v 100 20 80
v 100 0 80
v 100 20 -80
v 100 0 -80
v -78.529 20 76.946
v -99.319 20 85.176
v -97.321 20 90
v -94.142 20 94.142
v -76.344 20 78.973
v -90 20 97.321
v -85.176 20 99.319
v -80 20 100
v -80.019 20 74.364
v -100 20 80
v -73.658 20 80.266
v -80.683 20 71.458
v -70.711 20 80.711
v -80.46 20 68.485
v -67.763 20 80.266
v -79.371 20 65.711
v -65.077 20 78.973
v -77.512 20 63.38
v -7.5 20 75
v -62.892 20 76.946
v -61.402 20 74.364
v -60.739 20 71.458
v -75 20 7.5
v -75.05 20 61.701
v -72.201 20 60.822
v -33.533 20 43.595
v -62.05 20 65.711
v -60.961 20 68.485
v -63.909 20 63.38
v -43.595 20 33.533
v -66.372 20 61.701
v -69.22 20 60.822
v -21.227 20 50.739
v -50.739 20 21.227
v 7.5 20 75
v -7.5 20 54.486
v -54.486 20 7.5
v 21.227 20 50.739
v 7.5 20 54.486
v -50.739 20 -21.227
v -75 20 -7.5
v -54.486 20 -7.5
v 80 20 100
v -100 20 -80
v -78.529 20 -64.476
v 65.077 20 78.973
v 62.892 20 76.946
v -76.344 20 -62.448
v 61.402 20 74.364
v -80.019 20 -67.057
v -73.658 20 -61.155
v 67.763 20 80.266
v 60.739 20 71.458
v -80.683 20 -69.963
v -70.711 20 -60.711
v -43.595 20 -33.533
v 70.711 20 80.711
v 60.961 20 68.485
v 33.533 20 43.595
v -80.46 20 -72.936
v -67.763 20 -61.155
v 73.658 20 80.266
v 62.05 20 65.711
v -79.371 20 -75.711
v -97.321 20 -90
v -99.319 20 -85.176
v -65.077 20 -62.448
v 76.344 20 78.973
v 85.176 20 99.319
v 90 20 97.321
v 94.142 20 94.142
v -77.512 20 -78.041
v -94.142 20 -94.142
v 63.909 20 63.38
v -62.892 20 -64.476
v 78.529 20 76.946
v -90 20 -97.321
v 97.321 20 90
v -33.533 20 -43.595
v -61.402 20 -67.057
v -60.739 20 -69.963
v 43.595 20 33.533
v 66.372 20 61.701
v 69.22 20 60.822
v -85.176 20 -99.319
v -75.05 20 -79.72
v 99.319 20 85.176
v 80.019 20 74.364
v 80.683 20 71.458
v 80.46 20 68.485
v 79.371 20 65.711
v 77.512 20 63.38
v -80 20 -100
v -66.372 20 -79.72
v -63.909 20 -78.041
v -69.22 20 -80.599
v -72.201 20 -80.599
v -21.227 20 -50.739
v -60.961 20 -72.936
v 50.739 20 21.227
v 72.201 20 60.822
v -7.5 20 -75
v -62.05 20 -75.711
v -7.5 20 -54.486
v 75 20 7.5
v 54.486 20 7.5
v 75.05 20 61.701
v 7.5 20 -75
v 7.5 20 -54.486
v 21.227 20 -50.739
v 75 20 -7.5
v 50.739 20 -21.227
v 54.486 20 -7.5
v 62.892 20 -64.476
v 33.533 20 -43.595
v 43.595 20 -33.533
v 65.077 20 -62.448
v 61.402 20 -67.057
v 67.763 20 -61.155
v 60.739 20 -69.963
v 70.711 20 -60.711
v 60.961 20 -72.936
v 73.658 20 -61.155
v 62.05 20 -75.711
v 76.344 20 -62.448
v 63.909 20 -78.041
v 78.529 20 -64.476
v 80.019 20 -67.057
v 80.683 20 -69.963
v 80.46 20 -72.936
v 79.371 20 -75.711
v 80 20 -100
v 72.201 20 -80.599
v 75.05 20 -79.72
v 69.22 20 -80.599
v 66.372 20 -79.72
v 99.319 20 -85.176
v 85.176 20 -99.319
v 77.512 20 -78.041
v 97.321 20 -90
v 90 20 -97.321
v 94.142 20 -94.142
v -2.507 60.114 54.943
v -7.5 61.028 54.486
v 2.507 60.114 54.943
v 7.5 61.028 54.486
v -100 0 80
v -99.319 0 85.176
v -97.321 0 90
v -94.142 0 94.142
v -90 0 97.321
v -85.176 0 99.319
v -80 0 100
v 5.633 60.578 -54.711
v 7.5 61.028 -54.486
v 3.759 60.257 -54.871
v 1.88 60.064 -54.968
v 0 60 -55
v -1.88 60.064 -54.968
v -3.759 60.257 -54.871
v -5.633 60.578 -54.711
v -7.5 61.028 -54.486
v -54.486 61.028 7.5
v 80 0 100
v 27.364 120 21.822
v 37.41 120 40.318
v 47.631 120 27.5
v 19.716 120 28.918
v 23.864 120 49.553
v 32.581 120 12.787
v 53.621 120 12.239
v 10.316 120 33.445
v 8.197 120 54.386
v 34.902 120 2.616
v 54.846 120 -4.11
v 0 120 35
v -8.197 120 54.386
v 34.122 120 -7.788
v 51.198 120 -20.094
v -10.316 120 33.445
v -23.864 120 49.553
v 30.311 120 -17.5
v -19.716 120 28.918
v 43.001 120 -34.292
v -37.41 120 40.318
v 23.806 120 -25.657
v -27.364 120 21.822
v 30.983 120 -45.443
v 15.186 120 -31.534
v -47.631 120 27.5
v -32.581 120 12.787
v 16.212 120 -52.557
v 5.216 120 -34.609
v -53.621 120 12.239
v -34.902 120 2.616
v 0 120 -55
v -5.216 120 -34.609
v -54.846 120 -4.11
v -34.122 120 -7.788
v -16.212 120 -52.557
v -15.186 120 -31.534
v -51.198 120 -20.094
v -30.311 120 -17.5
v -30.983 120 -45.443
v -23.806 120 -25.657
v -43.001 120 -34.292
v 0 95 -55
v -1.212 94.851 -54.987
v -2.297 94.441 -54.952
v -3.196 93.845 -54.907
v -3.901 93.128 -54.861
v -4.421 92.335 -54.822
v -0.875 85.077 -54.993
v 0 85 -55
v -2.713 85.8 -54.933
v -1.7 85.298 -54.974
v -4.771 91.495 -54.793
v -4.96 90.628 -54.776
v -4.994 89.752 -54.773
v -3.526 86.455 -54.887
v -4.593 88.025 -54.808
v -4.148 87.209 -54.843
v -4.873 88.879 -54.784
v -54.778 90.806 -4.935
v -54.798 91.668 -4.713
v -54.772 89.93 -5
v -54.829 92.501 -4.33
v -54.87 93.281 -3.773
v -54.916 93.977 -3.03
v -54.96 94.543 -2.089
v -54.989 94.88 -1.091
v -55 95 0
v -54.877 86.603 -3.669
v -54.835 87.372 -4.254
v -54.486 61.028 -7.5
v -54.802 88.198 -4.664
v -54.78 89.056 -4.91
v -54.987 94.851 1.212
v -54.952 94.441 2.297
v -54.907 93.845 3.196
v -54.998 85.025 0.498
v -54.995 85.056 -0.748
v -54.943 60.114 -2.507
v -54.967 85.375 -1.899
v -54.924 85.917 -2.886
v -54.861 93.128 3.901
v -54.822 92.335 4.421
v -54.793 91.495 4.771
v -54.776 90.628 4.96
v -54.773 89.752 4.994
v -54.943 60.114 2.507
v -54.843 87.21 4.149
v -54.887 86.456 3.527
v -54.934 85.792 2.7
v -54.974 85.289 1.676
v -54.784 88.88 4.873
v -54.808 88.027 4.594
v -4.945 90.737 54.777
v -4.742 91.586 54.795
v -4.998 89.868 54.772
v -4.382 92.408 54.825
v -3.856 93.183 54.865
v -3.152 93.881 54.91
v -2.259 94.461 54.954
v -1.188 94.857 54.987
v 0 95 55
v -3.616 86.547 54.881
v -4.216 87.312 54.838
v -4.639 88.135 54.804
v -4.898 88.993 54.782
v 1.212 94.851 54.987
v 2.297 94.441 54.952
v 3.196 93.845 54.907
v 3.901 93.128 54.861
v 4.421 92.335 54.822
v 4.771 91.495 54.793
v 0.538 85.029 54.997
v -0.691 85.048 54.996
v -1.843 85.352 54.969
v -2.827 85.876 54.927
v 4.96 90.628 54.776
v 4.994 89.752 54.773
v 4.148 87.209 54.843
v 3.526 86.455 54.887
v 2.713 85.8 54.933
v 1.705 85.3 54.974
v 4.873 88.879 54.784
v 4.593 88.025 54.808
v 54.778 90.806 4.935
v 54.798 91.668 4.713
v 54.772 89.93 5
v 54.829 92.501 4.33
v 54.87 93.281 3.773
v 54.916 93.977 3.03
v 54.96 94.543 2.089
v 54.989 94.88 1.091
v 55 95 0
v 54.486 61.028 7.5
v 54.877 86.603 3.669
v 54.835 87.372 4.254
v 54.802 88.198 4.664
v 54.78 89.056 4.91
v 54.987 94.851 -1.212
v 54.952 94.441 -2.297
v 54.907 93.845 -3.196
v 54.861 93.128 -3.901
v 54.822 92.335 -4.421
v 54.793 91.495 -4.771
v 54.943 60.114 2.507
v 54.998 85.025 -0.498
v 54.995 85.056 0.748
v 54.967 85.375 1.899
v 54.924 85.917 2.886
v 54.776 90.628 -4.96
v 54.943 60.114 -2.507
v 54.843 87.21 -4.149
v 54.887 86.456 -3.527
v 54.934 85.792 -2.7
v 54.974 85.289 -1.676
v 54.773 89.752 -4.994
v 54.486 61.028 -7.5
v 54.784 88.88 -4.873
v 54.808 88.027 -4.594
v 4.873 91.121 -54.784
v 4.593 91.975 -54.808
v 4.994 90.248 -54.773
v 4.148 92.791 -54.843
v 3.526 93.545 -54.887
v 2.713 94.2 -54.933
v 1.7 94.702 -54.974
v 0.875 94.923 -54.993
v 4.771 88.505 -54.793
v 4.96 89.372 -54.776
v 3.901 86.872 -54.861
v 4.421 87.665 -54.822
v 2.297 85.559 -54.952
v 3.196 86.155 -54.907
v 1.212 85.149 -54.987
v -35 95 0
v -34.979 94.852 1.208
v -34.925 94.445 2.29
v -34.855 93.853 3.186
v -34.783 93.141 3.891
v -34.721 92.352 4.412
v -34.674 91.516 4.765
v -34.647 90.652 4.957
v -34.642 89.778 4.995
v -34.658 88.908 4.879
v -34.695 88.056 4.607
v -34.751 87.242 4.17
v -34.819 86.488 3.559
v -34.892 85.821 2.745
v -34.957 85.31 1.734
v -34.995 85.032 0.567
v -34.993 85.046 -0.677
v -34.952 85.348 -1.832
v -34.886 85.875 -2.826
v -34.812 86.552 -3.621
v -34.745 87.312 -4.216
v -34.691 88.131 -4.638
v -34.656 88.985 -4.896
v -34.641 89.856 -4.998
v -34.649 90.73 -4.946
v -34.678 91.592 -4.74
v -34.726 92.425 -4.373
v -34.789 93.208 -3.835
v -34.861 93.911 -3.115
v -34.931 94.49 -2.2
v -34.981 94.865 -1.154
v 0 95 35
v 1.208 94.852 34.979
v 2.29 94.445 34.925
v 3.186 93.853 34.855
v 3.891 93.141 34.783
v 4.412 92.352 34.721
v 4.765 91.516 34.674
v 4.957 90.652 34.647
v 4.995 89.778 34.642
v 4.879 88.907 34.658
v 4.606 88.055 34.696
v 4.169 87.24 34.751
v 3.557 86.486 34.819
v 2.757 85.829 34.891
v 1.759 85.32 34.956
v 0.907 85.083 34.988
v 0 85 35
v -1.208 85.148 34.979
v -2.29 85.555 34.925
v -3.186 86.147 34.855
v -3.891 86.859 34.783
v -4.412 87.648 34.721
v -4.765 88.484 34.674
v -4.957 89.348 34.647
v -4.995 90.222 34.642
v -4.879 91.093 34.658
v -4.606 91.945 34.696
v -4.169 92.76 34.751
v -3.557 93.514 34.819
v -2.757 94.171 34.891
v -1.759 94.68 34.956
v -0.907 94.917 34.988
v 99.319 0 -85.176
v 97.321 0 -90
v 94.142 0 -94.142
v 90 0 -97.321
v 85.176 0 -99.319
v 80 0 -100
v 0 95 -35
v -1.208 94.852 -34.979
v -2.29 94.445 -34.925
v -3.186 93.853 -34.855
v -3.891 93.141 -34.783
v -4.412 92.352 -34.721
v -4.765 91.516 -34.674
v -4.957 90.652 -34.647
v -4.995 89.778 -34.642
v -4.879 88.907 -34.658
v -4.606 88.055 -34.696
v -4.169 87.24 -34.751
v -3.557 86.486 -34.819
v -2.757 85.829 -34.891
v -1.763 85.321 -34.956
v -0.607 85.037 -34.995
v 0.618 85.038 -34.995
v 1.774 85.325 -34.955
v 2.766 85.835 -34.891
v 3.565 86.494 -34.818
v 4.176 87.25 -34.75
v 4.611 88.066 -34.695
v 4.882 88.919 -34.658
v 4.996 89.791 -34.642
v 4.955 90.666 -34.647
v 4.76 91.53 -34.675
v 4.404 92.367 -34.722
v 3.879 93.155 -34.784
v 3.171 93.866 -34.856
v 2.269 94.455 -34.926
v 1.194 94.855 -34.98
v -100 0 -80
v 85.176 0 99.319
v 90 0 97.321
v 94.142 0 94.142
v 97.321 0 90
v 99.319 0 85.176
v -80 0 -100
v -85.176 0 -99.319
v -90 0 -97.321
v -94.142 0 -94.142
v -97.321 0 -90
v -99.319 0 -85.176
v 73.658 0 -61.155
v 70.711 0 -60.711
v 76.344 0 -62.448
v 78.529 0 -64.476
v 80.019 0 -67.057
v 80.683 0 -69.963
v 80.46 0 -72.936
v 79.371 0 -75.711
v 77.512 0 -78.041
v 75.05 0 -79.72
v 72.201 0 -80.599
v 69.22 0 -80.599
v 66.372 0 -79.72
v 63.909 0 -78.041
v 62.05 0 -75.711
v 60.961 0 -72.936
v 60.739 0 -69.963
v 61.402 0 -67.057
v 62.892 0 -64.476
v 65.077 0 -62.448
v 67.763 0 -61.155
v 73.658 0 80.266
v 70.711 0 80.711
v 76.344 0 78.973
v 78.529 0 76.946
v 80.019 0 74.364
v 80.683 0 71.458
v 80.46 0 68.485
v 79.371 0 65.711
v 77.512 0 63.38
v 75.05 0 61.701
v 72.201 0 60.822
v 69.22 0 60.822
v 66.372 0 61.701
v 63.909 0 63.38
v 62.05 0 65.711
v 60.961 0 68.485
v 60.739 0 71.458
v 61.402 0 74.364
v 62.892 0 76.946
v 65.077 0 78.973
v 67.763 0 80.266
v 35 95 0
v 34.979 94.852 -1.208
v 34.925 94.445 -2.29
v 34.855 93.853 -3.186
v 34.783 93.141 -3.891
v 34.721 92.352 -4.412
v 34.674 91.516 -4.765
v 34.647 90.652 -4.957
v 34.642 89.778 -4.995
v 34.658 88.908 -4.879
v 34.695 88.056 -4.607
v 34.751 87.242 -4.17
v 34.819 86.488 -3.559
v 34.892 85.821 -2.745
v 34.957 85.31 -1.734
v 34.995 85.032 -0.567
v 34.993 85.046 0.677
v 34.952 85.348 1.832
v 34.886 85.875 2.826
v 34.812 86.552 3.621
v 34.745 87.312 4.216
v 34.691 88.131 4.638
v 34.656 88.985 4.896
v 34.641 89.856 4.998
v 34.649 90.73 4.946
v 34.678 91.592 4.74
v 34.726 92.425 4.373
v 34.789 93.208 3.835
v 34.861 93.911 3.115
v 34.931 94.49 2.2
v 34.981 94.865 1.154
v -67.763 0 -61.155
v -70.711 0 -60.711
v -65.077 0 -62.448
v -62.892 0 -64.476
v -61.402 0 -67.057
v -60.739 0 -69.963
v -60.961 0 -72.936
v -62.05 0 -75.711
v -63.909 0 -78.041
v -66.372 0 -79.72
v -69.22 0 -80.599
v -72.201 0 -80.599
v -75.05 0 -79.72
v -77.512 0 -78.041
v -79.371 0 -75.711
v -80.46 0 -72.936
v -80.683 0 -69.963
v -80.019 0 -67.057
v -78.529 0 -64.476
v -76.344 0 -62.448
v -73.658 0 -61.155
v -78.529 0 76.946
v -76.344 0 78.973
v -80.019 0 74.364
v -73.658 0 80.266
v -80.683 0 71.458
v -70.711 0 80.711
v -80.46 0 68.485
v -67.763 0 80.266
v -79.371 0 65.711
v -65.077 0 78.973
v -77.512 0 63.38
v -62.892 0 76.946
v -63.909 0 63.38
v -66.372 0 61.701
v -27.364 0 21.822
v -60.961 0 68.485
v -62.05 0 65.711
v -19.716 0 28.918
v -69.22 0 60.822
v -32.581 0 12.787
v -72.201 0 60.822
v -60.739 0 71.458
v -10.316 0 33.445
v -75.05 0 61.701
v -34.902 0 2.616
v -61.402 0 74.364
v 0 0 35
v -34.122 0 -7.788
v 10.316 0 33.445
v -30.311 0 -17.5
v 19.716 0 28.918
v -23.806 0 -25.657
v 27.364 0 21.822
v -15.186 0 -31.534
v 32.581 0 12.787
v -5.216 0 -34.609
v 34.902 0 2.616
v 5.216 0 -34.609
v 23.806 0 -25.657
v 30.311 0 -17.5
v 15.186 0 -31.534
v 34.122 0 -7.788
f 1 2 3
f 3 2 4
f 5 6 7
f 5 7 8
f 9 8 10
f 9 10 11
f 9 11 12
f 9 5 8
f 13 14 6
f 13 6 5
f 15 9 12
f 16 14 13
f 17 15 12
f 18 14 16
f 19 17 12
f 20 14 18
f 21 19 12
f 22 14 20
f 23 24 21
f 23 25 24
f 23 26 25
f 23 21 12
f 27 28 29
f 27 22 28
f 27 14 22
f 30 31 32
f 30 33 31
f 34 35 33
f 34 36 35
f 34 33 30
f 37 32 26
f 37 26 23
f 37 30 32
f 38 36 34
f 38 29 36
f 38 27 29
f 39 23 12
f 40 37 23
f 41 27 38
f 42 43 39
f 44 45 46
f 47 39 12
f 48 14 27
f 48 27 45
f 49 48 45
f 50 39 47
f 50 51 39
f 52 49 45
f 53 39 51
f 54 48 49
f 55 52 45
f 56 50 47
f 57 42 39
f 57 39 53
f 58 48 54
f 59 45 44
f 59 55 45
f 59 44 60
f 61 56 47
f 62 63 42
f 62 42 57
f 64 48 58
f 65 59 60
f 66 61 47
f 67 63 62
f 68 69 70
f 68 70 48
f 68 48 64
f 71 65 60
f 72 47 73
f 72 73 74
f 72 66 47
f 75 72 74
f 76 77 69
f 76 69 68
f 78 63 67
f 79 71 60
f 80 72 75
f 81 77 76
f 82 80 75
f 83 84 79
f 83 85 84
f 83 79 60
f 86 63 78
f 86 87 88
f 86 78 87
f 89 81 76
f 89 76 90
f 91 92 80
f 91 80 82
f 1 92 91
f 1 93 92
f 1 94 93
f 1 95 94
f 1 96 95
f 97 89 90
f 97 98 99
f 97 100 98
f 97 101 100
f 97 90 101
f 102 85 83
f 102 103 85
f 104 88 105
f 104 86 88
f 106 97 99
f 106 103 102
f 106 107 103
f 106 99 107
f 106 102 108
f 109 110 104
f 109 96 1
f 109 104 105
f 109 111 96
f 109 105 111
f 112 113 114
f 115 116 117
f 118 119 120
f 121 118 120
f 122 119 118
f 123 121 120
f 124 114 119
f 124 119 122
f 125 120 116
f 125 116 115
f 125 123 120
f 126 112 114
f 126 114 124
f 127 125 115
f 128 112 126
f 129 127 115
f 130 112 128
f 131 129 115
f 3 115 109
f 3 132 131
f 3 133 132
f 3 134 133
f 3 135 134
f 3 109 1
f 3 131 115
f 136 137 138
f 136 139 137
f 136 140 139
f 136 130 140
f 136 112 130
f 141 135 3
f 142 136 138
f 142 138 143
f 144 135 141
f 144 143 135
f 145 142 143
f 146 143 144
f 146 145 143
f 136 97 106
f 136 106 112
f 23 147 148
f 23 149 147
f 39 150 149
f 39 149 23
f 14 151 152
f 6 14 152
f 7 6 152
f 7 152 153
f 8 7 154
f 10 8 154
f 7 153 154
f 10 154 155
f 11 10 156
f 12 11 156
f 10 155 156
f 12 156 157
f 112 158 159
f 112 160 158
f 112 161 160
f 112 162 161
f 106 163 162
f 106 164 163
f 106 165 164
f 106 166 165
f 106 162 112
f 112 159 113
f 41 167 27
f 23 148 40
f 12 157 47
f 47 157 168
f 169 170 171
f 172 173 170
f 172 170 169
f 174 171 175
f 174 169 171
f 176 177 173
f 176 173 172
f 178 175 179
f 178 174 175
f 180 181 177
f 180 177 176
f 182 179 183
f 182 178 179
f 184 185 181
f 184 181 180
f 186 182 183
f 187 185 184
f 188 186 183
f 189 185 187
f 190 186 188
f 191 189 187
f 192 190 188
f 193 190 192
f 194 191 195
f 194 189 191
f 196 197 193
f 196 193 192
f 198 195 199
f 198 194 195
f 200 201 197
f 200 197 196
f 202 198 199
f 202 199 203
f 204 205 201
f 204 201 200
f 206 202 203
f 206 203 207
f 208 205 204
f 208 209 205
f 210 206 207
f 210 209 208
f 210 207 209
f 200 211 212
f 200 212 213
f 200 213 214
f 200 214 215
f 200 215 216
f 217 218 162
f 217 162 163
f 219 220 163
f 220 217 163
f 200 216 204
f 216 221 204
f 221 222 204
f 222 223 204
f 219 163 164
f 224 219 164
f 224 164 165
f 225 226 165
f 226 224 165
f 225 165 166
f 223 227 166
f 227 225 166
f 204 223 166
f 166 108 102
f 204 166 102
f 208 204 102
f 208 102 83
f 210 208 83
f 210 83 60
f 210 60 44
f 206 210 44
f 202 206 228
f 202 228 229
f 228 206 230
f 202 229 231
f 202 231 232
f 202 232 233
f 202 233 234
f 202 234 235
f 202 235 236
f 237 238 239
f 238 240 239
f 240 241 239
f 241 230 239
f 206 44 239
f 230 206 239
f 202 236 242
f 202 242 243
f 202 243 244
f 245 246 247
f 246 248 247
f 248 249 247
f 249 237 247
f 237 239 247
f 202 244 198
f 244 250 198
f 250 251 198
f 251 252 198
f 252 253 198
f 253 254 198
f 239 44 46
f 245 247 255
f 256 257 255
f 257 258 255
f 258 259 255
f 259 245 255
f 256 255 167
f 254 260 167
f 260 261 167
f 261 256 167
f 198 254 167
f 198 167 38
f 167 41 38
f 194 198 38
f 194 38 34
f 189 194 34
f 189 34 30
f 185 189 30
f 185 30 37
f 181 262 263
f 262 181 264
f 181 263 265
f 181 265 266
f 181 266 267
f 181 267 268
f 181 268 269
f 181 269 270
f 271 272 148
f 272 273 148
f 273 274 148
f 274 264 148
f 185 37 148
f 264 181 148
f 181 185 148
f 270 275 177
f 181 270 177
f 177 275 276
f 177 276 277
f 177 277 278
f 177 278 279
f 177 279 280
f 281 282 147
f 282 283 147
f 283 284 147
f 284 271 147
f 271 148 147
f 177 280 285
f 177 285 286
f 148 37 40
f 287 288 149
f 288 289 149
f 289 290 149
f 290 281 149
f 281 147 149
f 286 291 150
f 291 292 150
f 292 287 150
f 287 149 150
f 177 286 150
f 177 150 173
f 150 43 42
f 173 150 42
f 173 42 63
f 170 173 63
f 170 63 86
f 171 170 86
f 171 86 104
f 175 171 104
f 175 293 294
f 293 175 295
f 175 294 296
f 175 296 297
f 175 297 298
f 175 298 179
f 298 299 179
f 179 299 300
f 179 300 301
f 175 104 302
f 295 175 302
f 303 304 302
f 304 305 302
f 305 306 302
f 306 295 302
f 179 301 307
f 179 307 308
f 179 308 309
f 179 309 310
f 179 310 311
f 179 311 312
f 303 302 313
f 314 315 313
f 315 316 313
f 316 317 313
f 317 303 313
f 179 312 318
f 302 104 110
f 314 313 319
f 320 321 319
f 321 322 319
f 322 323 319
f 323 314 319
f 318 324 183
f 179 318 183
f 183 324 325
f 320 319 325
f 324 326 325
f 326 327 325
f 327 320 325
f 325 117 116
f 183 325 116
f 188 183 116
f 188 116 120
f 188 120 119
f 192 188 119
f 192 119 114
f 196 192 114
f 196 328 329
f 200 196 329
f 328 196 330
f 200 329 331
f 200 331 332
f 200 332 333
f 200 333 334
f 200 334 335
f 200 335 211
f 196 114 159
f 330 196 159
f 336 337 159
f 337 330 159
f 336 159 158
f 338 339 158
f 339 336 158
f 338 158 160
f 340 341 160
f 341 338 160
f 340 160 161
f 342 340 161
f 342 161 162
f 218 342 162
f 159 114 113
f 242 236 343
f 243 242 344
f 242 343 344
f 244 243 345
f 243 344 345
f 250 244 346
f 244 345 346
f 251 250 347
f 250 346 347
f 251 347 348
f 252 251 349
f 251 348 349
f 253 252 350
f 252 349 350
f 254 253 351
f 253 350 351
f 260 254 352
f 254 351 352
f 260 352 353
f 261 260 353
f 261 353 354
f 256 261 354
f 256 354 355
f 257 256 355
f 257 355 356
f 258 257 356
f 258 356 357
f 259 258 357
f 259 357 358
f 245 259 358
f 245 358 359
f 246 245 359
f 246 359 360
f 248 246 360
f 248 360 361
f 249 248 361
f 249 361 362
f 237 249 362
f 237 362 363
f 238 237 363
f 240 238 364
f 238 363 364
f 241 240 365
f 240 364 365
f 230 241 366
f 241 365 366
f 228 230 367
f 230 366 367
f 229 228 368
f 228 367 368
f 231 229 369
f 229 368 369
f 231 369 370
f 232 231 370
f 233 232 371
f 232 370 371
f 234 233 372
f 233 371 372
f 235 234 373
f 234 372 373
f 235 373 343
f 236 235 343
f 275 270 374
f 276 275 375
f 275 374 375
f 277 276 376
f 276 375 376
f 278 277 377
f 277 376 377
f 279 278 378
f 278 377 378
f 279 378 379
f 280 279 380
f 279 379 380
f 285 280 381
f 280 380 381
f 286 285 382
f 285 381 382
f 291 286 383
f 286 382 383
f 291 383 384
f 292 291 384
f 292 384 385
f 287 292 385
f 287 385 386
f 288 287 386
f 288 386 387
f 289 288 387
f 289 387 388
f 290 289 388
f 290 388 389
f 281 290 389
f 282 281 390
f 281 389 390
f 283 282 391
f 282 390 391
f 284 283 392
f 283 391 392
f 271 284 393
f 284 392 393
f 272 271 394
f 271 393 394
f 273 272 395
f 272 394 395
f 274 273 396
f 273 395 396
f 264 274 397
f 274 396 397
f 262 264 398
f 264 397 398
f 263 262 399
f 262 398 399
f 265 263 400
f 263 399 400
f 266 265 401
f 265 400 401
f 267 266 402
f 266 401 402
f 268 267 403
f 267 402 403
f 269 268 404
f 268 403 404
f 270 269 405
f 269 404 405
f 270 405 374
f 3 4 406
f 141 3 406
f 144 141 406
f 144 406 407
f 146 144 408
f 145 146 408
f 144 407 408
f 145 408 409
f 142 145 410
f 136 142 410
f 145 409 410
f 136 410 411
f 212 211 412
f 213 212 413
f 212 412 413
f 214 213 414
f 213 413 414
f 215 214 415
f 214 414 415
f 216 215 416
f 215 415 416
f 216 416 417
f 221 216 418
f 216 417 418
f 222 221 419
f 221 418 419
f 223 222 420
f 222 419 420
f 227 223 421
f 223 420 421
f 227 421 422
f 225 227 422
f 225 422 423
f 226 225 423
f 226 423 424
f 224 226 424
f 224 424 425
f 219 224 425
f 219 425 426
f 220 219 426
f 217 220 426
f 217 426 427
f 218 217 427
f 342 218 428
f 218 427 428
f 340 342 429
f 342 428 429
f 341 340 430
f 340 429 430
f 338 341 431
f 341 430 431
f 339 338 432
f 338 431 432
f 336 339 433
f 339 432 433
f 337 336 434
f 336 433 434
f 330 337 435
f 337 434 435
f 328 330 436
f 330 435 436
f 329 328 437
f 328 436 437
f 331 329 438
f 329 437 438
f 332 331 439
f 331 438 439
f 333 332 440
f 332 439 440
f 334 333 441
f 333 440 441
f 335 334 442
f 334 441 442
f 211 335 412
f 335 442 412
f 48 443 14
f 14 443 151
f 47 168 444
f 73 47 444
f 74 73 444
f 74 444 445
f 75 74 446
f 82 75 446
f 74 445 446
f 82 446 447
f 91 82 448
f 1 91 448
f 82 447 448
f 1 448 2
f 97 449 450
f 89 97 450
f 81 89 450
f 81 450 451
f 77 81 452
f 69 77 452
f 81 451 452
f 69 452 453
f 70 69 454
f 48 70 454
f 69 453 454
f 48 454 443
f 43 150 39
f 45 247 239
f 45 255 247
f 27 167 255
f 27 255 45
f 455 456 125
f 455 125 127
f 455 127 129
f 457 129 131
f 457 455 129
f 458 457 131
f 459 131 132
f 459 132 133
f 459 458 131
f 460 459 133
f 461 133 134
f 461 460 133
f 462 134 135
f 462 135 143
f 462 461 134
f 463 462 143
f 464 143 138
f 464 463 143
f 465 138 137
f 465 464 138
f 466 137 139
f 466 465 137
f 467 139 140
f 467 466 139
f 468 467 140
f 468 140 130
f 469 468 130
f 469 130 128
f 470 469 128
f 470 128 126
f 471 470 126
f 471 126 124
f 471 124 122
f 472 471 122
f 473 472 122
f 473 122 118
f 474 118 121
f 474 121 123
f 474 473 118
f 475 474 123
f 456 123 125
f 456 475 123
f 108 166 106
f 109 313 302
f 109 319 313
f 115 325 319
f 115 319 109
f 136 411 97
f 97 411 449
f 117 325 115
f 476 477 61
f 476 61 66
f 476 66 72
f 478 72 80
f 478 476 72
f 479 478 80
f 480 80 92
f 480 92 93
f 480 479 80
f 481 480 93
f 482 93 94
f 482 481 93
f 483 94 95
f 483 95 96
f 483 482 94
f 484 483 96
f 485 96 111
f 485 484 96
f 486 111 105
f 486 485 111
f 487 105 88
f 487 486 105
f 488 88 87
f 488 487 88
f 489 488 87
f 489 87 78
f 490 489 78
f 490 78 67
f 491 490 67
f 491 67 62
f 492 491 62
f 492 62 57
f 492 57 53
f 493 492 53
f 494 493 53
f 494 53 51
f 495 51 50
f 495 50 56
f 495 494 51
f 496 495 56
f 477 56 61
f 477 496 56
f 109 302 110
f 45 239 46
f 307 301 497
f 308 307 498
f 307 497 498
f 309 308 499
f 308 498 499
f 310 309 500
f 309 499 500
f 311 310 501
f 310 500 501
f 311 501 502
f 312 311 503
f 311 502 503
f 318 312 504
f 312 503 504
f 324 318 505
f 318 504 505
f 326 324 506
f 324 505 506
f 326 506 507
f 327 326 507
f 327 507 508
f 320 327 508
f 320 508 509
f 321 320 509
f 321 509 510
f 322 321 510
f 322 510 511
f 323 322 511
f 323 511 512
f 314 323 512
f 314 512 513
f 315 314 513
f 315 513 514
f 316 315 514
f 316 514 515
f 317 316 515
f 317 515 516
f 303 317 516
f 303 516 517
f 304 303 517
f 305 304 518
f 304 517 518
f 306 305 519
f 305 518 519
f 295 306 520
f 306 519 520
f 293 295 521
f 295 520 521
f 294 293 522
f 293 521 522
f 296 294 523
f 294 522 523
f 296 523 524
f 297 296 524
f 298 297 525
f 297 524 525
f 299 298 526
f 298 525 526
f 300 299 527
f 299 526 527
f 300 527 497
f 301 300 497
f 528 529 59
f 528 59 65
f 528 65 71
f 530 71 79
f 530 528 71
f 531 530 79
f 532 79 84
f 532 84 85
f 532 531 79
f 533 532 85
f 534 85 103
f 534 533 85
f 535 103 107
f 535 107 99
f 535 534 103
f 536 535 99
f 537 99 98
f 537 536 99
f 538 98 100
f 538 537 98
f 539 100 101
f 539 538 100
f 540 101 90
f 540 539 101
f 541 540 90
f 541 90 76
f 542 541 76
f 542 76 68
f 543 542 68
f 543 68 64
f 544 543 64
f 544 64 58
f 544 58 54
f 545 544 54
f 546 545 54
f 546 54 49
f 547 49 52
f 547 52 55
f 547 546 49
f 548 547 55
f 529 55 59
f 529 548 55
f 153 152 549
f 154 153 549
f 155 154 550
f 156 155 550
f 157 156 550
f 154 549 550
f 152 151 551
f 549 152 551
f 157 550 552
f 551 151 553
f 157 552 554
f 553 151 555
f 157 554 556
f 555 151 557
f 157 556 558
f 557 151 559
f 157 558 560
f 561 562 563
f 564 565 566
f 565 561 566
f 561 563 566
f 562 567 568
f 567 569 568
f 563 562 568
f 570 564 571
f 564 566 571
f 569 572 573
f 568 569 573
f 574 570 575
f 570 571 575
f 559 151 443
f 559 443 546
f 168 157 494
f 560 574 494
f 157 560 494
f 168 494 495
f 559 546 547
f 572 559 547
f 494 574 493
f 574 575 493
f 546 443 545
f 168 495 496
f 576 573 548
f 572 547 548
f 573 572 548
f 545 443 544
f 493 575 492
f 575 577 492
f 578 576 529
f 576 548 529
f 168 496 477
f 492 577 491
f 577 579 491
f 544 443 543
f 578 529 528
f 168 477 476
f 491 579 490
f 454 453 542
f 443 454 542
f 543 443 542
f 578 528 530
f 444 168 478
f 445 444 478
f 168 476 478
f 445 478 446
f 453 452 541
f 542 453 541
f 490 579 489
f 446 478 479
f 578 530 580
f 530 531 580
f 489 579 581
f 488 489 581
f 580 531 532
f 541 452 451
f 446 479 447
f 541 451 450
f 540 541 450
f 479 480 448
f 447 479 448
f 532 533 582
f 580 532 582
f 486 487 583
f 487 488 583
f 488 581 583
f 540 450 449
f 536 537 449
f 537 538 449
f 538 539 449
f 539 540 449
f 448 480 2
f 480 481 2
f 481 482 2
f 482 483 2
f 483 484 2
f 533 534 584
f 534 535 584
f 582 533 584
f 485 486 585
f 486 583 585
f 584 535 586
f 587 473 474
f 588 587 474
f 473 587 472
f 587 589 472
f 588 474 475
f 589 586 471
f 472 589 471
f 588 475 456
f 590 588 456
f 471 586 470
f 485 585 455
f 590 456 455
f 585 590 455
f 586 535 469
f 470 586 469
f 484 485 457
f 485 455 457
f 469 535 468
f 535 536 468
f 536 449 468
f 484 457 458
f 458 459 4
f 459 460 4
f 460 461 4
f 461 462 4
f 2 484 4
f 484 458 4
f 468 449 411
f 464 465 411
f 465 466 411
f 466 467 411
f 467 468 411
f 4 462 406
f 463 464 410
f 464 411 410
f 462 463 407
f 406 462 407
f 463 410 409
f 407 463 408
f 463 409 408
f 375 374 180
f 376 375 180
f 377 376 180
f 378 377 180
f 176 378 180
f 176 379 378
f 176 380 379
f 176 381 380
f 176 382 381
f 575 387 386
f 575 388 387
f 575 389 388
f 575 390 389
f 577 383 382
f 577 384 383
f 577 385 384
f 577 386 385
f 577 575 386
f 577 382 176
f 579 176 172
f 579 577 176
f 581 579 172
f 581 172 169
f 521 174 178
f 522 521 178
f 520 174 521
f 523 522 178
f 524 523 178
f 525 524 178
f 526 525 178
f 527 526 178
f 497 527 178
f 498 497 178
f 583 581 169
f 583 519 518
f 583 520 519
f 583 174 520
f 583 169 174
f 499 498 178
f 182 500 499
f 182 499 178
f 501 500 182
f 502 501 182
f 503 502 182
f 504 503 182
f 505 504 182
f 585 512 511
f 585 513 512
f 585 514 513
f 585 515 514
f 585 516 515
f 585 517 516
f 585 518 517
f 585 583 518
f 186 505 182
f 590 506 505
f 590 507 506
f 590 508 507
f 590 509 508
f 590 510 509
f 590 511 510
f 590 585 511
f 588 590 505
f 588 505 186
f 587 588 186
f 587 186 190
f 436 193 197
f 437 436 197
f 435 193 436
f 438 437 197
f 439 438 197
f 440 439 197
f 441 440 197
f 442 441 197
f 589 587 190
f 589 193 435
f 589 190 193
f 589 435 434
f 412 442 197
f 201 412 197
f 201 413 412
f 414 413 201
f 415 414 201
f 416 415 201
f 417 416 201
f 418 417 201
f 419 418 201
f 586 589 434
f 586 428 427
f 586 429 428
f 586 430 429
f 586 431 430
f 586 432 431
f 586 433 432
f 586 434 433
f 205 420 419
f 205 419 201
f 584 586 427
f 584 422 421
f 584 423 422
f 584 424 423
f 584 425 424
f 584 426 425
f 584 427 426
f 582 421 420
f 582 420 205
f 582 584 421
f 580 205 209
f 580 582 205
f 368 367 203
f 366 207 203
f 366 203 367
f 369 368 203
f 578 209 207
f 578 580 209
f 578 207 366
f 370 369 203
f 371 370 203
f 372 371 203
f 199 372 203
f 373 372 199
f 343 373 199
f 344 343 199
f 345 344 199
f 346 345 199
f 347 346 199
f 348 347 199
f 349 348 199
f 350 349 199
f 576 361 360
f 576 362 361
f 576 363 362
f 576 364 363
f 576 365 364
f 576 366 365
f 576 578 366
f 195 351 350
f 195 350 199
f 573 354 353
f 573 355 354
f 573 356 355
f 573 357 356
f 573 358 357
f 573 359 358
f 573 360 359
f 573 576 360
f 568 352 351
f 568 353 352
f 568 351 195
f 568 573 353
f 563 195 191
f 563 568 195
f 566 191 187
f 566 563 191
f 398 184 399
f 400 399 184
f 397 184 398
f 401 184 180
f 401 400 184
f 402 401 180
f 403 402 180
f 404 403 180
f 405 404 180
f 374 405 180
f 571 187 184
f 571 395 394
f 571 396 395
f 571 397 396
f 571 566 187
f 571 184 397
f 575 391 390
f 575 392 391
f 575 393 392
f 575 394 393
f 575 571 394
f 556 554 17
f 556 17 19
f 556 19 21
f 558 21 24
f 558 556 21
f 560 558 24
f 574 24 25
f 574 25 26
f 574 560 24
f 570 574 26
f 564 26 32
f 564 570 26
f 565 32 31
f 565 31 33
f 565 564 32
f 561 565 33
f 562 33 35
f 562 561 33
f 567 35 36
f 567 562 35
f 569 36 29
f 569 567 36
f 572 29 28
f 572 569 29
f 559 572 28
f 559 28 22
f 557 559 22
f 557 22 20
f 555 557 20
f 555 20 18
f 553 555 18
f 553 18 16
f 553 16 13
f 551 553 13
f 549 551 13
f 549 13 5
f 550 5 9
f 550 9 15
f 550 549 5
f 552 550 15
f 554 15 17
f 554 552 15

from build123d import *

# Parameters (mm, degrees)
SKETCH2_R           = 10
SKETCH2_R_2         = 35
BOSS_EXTRUDE1_DEPTH = 20
SKETCH5_R           = 55
SKETCH5_R_2         = 35
BOSS_EXTRUDE2_DEPTH = 100
RIB1_REACH          = 187.472
SKETCH6_WALL_W      = 417.66609937
SKETCH6_WALL_H      = 15
CIRPATTERN1_COUNT   = 4
SKETCH7_R           = 5
CUT_EXTRUDE2_DEPTH  = 186.47236991
CIRPATTERN2_COUNT   = 4


with BuildPart() as part:
    # Sketch2 → Boss-Extrude1 (new body)
    with BuildSketch(Plane(origin=(0, 0, 0), x_dir=(1, 0, 0), z_dir=(0, 1, 0))):
        with BuildLine():
            Line((-80, -100), (80, -100))
            ThreePointArc((80, -100), (94.142135624, -94.142135624), (100, -80))
            Line((100, -80), (100, 80))
            ThreePointArc((100, 80), (94.142135624, 94.142135624), (80, 100))
            Line((80, 100), (-80, 100))
            ThreePointArc((-80, 100), (-94.142135624, 94.142135624), (-100, 80))
            Line((-100, 80), (-100, -80))
            ThreePointArc((-100, -80), (-94.142135624, -94.142135624), (-80, -100))
        make_face()
        with Locations(Location((-70.710678119, 70.710678119, 0), (0, 0, 270))):
            Circle(SKETCH2_R, mode=Mode.SUBTRACT)
        with Locations(Location((70.710678119, 70.710678119, 0), (0, 0, 270))):
            Circle(SKETCH2_R, mode=Mode.SUBTRACT)
        with Locations(Location((-70.710678119, -70.710678119, 0), (0, 0, 270))):
            Circle(SKETCH2_R, mode=Mode.SUBTRACT)
        with Locations(Location((70.710678119, -70.710678119, 0), (0, 0, 270))):
            Circle(SKETCH2_R, mode=Mode.SUBTRACT)
        with Locations(Location((0, 0, 0), (0, 0, 270))):
            Circle(SKETCH2_R_2, mode=Mode.SUBTRACT)
    extrude(amount=BOSS_EXTRUDE1_DEPTH)

    # Sketch5 → Boss-Extrude2 (add)
    with BuildSketch(Plane(origin=(0, 20, 0), x_dir=(1, 0, 0), z_dir=(0, 1, 0))):
        with Locations(Location((0, 0, 0), (0, 0, 90))):
            Circle(SKETCH5_R)
        with Locations(Location((0, 0, 0), (0, 0, 270))):
            Circle(SKETCH5_R_2, mode=Mode.SUBTRACT)
    extrude(amount=BOSS_EXTRUDE2_DEPTH)

    # Sketch6 wall → Rib1 (add, up to next)
    with BuildSketch(Plane(origin=(65, 40, 0), x_dir=(0.4472135955, -0.894427191, 0), z_dir=(0.894427191, 0.4472135955, 0)), mode=Mode.PRIVATE) as rib1_sk1:
        Rectangle(SKETCH6_WALL_W, SKETCH6_WALL_H)
    rib1_tool1 = extrude(rib1_sk1.sketch, amount=-RIB1_REACH, mode=Mode.PRIVATE) - part.part
    rib1 = rib1_tool1.solids().sort_by_distance((65, 40, 0))[0]
    add(rib1)

    # CirPattern1: Rib1 ×4 about axis
    cirpattern1_axis = Axis((0, 0, 0), (0, 1, 0))
    for i in range(1, CIRPATTERN1_COUNT):
        add(rib1.rotate(cirpattern1_axis, i * 360 / CIRPATTERN1_COUNT))

    # Sketch7 → Cut-Extrude2 (cut, through all)
    with BuildSketch(Plane.XY):
        with Locations(Location((0, 90, 0), (0, 0, 90))):
            Circle(SKETCH7_R)
    cut_extrude2 = extrude(amount=-CUT_EXTRUDE2_DEPTH, mode=Mode.SUBTRACT)

    # CirPattern2: Cut-Extrude2 ×4 about axis
    cirpattern2_axis = Axis((0, 0, 0), (0, -1, 0))
    for i in range(1, CIRPATTERN2_COUNT):
        add(cut_extrude2.rotate(cirpattern2_axis, i * 360 / CIRPATTERN2_COUNT), mode=Mode.SUBTRACT)


solid = part.part
